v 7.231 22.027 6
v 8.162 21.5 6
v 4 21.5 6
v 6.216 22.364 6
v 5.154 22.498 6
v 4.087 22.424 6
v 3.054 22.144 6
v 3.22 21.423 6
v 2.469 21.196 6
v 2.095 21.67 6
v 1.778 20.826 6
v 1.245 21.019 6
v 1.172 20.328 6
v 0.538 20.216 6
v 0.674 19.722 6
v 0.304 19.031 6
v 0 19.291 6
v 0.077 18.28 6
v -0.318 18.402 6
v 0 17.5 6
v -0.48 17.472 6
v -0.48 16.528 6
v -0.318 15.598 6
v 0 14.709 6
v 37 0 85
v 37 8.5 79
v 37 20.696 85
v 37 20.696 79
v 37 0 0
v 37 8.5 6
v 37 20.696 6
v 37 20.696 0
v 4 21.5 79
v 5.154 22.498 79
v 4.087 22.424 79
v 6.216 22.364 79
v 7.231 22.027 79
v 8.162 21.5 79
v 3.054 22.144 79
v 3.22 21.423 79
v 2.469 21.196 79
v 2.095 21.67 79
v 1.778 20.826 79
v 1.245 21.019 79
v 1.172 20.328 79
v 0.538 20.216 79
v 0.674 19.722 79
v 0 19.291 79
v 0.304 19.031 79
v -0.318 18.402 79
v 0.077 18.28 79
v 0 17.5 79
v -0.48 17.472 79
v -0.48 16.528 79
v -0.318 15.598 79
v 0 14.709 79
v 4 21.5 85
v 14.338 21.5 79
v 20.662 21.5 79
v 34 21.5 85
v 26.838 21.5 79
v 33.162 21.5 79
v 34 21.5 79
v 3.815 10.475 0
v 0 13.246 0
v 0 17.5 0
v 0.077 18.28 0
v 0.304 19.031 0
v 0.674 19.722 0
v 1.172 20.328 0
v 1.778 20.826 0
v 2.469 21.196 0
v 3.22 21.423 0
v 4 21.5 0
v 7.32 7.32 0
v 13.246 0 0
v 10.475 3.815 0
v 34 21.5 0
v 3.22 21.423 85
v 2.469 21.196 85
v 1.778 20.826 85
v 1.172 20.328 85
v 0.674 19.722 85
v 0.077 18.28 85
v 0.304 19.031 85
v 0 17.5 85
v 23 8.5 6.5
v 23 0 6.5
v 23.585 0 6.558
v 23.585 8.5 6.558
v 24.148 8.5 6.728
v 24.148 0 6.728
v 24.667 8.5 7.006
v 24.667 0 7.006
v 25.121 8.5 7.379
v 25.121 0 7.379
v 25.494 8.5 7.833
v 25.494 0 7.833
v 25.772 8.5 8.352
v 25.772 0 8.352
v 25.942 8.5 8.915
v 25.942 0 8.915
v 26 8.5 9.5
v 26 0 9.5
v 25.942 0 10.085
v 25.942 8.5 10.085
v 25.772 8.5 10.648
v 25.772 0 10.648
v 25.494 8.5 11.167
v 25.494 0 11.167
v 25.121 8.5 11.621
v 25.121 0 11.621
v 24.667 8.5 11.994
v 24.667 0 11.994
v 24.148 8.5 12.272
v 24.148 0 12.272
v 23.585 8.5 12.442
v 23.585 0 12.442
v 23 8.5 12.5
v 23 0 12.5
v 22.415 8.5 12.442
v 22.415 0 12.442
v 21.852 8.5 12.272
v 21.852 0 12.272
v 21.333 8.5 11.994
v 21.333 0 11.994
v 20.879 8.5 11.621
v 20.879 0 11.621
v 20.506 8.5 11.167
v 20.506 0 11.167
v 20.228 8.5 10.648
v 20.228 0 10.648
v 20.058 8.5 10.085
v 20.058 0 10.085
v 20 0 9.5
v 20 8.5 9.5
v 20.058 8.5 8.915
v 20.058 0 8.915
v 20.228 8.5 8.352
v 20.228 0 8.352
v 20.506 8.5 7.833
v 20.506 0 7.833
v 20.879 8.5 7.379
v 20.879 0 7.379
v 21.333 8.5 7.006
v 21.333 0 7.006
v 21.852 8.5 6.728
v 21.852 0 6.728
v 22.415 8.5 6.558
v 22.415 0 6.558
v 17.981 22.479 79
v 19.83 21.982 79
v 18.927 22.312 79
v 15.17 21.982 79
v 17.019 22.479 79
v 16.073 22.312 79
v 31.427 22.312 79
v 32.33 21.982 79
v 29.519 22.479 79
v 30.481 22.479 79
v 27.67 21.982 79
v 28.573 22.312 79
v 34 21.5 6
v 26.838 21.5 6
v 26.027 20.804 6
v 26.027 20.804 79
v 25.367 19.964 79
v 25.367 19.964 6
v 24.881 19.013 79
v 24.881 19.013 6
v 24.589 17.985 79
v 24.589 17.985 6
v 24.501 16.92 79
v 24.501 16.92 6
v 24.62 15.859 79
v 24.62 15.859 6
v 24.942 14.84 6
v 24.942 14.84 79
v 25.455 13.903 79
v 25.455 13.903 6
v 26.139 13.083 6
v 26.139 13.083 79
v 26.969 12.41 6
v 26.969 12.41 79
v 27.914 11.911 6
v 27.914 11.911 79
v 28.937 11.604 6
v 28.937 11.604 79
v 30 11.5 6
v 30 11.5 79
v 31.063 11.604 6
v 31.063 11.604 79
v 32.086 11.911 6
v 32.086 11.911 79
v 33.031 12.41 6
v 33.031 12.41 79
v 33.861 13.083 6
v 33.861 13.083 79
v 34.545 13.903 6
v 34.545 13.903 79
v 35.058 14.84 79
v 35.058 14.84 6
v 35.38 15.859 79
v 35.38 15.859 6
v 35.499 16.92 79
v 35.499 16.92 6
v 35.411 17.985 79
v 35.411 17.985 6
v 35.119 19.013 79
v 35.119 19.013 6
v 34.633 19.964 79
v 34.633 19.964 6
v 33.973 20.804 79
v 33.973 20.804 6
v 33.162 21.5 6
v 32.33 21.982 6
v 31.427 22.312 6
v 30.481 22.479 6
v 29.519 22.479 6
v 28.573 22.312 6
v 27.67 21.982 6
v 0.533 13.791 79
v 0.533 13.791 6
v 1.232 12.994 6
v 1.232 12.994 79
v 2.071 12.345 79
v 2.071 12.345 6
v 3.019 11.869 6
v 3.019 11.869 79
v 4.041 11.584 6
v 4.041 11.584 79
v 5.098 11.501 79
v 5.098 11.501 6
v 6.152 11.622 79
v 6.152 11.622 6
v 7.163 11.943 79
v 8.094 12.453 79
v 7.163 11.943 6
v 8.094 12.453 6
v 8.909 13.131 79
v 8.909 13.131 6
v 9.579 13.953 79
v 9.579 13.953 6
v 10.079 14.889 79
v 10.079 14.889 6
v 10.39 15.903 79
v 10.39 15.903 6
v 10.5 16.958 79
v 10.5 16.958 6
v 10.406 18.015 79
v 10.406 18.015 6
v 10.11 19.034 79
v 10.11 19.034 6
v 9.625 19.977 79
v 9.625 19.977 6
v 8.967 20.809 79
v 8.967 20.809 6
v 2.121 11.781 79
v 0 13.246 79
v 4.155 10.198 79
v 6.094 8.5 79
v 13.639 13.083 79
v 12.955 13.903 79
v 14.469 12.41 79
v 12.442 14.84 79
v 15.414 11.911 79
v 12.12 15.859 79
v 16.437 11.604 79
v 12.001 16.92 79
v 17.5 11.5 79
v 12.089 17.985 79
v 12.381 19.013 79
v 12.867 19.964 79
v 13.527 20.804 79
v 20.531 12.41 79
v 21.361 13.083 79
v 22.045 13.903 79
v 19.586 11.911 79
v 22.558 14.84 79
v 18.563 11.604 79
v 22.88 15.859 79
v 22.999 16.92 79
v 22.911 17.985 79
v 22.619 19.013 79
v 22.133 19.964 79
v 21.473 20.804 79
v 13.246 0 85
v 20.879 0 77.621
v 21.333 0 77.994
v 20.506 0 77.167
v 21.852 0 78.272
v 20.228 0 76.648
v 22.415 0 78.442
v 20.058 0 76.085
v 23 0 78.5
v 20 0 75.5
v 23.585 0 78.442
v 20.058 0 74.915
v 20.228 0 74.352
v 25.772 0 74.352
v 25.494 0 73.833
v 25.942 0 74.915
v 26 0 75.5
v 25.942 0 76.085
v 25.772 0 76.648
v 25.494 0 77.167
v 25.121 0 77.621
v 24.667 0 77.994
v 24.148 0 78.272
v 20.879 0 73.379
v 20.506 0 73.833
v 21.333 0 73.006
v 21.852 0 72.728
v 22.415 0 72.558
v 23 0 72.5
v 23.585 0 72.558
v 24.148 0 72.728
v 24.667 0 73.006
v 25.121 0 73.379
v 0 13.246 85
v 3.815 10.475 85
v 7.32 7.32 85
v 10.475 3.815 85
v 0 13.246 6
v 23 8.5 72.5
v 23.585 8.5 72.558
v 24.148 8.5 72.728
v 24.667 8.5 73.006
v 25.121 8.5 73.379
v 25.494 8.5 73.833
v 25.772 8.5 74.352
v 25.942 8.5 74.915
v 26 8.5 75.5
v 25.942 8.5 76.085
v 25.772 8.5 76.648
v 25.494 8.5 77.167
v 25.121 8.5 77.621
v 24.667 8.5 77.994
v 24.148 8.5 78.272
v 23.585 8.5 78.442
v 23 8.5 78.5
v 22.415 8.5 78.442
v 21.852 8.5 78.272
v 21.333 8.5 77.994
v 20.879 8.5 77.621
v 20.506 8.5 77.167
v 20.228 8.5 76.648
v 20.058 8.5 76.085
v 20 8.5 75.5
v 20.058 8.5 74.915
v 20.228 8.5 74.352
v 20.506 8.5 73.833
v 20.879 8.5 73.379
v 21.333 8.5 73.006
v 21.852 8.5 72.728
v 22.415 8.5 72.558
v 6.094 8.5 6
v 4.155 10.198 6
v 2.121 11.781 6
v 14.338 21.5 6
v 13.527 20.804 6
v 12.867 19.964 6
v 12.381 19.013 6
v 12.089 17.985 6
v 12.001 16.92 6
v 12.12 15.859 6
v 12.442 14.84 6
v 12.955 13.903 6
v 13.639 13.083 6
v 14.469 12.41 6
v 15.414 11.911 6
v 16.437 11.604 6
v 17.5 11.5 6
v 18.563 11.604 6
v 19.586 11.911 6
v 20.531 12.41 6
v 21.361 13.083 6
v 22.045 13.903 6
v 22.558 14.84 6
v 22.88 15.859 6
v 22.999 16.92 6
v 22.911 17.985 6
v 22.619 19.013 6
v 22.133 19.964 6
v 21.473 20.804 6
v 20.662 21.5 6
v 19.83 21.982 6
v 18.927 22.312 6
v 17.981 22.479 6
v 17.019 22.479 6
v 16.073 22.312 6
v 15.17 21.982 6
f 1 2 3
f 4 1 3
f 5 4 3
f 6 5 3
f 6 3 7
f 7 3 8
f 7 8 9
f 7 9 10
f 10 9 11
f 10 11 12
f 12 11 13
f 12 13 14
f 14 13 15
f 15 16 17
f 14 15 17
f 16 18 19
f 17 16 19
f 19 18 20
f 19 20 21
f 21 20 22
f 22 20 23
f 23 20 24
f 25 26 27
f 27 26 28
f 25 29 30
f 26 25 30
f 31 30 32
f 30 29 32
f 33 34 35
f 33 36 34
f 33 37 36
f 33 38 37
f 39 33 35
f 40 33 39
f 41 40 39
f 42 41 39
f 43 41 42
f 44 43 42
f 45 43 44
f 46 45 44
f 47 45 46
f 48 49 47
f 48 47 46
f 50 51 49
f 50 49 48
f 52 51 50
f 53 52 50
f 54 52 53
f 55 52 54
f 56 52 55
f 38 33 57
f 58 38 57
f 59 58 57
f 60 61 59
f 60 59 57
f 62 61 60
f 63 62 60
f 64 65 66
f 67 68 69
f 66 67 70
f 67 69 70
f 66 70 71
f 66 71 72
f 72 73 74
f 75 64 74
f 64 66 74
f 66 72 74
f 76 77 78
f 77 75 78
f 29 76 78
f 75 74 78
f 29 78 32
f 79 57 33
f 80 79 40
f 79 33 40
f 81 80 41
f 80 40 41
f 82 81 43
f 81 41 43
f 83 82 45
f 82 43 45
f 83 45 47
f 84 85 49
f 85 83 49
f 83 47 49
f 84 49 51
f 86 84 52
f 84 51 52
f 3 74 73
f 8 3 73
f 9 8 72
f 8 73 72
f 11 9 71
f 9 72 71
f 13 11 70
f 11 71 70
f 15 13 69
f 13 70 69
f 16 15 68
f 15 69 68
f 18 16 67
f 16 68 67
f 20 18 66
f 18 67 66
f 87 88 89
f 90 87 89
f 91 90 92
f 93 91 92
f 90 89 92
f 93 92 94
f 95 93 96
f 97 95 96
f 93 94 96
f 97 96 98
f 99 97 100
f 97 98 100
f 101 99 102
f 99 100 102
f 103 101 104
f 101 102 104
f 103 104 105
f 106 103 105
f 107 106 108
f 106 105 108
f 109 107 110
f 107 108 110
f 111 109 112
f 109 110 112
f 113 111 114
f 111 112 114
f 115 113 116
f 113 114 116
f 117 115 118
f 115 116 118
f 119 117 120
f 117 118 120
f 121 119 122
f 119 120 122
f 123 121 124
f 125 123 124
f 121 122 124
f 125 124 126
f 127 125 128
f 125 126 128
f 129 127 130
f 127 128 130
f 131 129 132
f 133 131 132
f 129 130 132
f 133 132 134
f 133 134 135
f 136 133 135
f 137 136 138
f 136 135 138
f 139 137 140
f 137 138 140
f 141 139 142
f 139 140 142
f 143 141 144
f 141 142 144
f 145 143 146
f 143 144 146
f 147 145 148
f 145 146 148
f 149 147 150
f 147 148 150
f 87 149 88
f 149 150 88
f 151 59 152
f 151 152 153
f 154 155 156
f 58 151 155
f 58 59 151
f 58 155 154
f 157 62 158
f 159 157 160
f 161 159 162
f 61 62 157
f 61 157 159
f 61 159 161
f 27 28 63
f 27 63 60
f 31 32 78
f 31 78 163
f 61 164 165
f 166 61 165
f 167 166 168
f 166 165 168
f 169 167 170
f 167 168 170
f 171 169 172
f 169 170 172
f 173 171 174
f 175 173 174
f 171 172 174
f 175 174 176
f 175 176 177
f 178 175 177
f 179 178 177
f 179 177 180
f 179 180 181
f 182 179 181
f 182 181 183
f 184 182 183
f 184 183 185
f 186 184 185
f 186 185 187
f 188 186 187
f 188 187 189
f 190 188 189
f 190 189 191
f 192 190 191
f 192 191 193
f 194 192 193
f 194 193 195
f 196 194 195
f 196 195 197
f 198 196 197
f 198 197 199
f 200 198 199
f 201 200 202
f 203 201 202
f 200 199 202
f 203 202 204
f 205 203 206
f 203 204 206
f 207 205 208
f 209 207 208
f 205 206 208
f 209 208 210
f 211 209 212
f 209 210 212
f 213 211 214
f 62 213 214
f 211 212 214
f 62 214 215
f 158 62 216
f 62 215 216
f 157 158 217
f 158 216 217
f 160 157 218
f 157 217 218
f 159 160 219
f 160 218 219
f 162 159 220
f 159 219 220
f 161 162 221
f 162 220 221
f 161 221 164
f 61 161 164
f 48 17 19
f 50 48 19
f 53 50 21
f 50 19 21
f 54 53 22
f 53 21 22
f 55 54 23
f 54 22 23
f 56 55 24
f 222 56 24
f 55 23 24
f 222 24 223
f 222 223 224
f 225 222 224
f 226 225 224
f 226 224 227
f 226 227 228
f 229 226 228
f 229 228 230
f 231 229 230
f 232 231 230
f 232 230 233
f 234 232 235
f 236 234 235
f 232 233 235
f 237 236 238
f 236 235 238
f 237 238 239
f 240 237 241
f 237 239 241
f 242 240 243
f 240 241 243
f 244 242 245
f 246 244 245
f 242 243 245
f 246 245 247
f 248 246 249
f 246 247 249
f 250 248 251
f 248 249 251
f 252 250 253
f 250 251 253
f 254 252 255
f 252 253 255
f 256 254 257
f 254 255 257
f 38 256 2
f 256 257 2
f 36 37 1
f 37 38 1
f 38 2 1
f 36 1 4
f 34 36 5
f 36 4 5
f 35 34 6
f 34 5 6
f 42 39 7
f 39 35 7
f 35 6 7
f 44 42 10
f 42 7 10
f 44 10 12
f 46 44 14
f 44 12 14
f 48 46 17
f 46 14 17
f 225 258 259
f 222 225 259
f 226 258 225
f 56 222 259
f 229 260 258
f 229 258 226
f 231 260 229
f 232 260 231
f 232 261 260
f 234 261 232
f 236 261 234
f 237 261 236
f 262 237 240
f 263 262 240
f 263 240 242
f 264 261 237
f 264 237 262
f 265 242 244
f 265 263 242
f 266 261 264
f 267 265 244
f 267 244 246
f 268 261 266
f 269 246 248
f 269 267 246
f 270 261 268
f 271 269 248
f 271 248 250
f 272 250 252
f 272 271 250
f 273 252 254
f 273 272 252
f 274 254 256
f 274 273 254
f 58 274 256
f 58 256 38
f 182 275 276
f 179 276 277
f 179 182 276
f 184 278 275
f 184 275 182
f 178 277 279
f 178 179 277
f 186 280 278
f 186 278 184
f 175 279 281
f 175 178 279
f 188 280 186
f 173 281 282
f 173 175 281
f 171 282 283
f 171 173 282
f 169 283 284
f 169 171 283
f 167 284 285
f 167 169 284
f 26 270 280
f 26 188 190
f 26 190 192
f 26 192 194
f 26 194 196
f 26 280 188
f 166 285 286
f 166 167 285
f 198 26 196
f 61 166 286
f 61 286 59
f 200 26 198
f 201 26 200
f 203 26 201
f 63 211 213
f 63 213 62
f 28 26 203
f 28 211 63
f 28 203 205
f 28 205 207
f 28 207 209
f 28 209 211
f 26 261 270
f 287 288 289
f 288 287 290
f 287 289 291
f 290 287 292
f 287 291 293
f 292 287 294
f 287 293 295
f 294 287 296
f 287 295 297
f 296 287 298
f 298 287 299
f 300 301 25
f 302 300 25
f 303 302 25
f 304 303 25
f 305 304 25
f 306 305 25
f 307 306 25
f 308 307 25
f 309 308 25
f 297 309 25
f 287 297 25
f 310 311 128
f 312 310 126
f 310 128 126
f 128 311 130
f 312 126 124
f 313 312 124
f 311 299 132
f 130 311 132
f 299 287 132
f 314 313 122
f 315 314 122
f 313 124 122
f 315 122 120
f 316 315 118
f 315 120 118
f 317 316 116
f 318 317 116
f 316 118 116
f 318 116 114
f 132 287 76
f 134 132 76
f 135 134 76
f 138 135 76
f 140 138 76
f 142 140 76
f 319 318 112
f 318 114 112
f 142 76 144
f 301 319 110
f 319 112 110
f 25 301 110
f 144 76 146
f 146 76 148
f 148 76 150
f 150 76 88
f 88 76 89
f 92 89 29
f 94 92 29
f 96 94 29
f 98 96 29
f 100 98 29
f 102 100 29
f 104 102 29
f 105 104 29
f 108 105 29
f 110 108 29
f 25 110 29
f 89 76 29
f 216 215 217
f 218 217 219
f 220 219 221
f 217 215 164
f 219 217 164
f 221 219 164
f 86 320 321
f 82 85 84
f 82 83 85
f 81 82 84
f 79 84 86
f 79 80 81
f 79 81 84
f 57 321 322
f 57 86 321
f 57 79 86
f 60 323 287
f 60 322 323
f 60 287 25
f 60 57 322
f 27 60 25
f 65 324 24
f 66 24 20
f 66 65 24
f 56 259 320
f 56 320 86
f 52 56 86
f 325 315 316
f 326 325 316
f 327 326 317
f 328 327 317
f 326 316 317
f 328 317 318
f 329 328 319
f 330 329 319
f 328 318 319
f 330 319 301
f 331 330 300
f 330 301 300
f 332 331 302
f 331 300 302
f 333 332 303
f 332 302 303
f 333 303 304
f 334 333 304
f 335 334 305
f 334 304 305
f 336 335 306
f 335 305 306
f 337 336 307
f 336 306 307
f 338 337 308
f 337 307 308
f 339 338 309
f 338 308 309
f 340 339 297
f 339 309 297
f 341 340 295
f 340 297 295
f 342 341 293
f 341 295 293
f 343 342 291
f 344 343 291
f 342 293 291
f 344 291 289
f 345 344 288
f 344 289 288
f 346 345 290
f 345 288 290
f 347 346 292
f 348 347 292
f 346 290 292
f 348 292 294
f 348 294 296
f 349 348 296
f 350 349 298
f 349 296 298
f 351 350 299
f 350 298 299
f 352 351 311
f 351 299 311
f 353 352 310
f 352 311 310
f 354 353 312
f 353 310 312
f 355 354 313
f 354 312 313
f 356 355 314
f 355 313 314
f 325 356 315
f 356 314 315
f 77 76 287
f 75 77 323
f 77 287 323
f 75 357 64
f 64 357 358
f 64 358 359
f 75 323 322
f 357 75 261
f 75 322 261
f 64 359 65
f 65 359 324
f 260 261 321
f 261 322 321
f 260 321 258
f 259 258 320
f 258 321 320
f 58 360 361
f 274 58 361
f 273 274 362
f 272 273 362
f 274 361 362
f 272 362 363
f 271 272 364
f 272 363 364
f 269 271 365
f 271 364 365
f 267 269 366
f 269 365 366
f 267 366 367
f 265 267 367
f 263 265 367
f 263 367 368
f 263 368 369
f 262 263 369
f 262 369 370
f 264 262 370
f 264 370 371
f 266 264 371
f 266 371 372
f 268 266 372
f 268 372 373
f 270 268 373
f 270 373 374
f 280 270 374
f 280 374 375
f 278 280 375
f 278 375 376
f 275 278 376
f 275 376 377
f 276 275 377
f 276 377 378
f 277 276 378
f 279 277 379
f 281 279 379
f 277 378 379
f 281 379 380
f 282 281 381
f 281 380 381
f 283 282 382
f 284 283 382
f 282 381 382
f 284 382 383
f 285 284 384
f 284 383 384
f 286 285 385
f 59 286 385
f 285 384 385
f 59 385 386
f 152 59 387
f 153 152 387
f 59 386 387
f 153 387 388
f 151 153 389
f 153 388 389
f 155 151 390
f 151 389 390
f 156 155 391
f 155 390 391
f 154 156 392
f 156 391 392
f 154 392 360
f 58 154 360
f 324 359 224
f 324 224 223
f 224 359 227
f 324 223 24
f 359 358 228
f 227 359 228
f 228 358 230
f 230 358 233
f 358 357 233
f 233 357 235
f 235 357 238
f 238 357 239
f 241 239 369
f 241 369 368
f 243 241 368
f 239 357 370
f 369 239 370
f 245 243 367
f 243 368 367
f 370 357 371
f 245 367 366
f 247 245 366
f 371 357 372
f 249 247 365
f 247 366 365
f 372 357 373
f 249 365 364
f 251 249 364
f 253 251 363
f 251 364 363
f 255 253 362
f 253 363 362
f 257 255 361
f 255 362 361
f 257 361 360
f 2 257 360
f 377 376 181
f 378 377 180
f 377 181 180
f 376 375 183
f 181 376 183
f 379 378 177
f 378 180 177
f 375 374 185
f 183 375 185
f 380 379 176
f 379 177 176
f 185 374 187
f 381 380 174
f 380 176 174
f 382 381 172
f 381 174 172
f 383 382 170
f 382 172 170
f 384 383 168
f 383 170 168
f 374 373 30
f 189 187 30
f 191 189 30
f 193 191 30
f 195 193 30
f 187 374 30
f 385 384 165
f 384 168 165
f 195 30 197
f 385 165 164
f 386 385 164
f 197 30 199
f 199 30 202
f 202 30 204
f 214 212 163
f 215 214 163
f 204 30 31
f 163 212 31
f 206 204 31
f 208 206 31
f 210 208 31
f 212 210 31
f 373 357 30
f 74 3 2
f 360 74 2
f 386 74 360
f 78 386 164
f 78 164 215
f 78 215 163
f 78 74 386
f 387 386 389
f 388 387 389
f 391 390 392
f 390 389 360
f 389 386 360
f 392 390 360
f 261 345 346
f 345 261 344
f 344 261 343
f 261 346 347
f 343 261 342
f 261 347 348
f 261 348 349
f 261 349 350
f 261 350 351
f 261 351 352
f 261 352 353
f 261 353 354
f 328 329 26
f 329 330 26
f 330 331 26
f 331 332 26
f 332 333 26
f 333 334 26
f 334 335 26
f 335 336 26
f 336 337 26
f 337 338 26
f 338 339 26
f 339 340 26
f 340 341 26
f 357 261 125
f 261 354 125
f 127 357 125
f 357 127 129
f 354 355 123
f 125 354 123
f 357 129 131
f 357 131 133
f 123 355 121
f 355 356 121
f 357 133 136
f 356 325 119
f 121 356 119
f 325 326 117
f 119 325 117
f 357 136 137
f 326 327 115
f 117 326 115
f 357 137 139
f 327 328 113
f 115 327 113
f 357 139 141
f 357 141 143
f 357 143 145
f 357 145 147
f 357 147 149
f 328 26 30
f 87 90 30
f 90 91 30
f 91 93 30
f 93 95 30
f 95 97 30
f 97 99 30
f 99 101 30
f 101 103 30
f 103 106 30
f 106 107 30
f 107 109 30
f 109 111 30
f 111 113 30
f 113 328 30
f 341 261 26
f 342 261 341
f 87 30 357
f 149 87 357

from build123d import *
from OCP.BRepFilletAPI import BRepFilletAPI_MakeChamfer

# Parameters (mm, degrees)
SCHIZZO1_W               = 37
SCHIZZO1_H               = 21.5
ESTRUSIONE1_DEPTH        = 85
SCHIZZO6_W               = 73
SCHIZZO6_H               = 23.639461627
TAGLIO_ESTRUSIONE4_DEPTH = 84
SCHIZZO7_R               = 5.5
ESTRUSIONE4_DEPTH        = 73
SMUSSO1_SIZE             = 3
SMUSSO1_SIZE2            = 0.803847577
RACCORDO1_R              = 4
SCHIZZO8_R               = 45
TAGLIO_ESTRUSIONE5_DEPTH = 96.395230489
SCHIZZO9_R               = 3
TAGLIO_ESTRUSIONE6_DEPTH = 8.5


with BuildPart() as part:
    # Schizzo1 → Estrusione1 (new body)
    with BuildSketch(Plane.XY):
        with Locations((18.5, 10.75)):
            Rectangle(SCHIZZO1_W, SCHIZZO1_H)
    extrude(amount=ESTRUSIONE1_DEPTH)

    # Schizzo6 → Taglio-Estrusione4 (cut)
    with BuildSketch(Plane(origin=(37, 0, 0), x_dir=(0, 0, -1), z_dir=(1, 0, 0))):
        with Locations((-42.5, 20.319730814)):
            Rectangle(SCHIZZO6_W, SCHIZZO6_H)
    extrude(amount=-TAGLIO_ESTRUSIONE4_DEPTH, mode=Mode.SUBTRACT)

    # Schizzo7 → Estrusione4 (add)
    with BuildSketch(Plane.XY.offset(6)):
        with Locations(Location((5, 17, 0), (0, 0, 155.380022671))):
            Circle(SCHIZZO7_R)
        with Locations(Location((17.5, 17, 0), (0, 0, 125.096801228))):
            Circle(SCHIZZO7_R)
        with Locations(Location((30, 17, 0), (0, 0, 125.096801228))):
            Circle(SCHIZZO7_R)
    extrude(amount=ESTRUSIONE4_DEPTH)

    # Smusso1: one chamfer whose edges measure the first distance from different faces: ONE call of the kernel's chamfer builder (chamfer() names one face for all edges)
    smusso1_edges_1 = [part.edges().sort_by_distance(p)[0] for p in [
        (37, 21.5, 3),
    ]]
    smusso1_side_1 = [part.faces().sort_by_distance(p)[0] for p in [
        (18.5, 21.5, 3),
    ]]
    smusso1_edges_2 = [part.edges().sort_by_distance(p)[0] for p in [
        (37, 21.5, 82),
    ]]
    smusso1_side_2 = [part.faces().sort_by_distance(p)[0] for p in [
        (18.5, 21.5, 82),
    ]]
    smusso1 = BRepFilletAPI_MakeChamfer(part.part.solid().wrapped)
    for e in smusso1_edges_1:
        smusso1.Add(SMUSSO1_SIZE, SMUSSO1_SIZE2, e.wrapped, smusso1_side_1[0].wrapped)  # the first distance lies on this face
    for e in smusso1_edges_2:
        smusso1.Add(SMUSSO1_SIZE, SMUSSO1_SIZE2, e.wrapped, smusso1_side_2[0].wrapped)  # the first distance lies on this face
    add(Compound.cast(smusso1.Shape()), mode=Mode.REPLACE)

    # Raccordo1
    # the kernel refuses this fillet: 4 mm, written as the material it takes off along each edge
    with BuildSketch(Plane(origin=(0, 21.5, -10), x_dir=(1, 0, 0), z_dir=(0, 0, 1))) as raccordo1_piece_1:
        with BuildLine():
            CenterArc((RACCORDO1_R, -RACCORDO1_R), RACCORDO1_R, 90, 90)
            Line((0, -RACCORDO1_R), (0, 0))
            Line((0, 0), (RACCORDO1_R, 0))
        make_face()
    extrude(amount=16, mode=Mode.SUBTRACT)
    with BuildSketch(Plane(origin=(0, 21.5, 79), x_dir=(0, -1, 0), z_dir=(0, 0, 1))) as raccordo1_piece_2:
        with BuildLine():
            CenterArc((RACCORDO1_R, RACCORDO1_R), RACCORDO1_R, 180, 90)
            Line((0, RACCORDO1_R), (0, 0))
            Line((0, 0), (RACCORDO1_R, 0))
        make_face()
    extrude(amount=16, mode=Mode.SUBTRACT)

    # Schizzo8 → Taglio-Estrusione5 (cut, through all)
    with BuildSketch(Plane.XY.offset(85)):
        with Locations((-24.5, -24.5)):
            Circle(SCHIZZO8_R)
    extrude(amount=-TAGLIO_ESTRUSIONE5_DEPTH, mode=Mode.SUBTRACT)

    # Schizzo9 → Taglio-Estrusione6 (cut)
    with BuildSketch(Plane.XZ):
        with Locations(Location((23, 75.5, 0), (0, 0, 270))):
            Circle(SCHIZZO9_R)
        with Locations(Location((23, 9.5, 0), (0, 0, 270))):
            Circle(SCHIZZO9_R)
    extrude(amount=-TAGLIO_ESTRUSIONE6_DEPTH, mode=Mode.SUBTRACT)


solid = part.part
